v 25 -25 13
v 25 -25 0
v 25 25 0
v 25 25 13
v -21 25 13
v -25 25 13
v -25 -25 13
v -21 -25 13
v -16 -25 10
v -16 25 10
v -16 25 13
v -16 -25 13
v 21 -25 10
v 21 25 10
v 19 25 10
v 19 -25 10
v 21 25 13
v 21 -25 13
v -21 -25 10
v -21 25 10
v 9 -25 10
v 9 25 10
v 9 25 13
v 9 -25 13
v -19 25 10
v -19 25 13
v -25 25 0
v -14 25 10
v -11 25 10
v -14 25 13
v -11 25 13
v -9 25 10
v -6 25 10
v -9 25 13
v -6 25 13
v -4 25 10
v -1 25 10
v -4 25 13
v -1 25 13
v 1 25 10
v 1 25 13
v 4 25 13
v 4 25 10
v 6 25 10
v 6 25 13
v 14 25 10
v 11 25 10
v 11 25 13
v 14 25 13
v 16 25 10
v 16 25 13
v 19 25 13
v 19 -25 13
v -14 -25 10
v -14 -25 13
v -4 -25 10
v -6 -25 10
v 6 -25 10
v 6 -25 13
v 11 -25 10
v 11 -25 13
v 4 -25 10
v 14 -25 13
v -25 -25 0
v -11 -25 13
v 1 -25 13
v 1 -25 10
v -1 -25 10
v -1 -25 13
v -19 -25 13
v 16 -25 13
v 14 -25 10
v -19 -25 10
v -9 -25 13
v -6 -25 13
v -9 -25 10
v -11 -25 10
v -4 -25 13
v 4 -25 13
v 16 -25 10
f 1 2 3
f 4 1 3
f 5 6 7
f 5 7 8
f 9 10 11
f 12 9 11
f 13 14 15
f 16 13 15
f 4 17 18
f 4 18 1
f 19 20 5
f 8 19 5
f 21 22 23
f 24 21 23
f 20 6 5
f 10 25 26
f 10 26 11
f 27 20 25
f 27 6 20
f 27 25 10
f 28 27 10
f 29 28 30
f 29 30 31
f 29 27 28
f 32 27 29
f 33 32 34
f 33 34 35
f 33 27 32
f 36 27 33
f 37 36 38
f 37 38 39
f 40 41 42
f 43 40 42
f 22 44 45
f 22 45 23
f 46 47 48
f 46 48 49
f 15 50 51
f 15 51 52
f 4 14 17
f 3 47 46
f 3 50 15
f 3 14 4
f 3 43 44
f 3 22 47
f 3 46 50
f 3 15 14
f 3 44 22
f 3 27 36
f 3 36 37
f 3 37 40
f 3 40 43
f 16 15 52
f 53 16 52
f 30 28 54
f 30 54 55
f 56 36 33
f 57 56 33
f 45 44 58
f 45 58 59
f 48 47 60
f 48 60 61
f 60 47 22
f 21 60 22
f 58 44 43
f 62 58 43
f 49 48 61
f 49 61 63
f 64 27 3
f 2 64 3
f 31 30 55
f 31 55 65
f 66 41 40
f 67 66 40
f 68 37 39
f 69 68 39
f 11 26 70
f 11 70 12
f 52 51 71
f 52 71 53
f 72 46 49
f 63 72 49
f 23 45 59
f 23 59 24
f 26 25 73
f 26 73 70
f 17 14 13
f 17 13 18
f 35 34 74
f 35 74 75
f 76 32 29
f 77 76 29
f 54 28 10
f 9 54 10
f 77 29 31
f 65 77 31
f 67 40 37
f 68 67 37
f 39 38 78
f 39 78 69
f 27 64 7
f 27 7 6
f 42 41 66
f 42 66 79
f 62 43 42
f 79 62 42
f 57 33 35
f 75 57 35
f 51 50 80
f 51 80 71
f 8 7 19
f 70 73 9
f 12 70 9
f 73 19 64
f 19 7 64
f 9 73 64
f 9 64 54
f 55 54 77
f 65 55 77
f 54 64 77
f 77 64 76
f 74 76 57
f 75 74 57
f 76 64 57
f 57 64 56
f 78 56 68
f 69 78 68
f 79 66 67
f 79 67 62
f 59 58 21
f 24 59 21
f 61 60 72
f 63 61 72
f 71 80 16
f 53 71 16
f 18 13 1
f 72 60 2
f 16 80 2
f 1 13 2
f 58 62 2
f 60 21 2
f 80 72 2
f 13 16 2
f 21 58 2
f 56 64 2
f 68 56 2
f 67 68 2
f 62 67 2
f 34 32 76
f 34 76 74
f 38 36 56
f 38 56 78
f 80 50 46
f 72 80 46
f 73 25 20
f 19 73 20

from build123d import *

# Parameters (mm, degrees)
F0_W     = 50
F0_H     = 50
F1_DEPTH = 13
F2_W     = 2
F2_H     = 3
F3_DEPTH = 50.001


with BuildPart() as f1:
    # F0 (on Top) → F1 (new body)
    with BuildSketch(Plane.XY):
        Rectangle(F0_W, F0_H)
    extrude(amount=F1_DEPTH)

    # F2 (on face) → F3 (cut, through all)
    with BuildSketch(Plane(origin=(0, 25, 0), x_dir=(-1, 0, 0), z_dir=(0, 1, 0))):
        with Locations((-20, 11.5)):
            Rectangle(F2_W, F2_H)
        with Locations((-15, 11.5)):
            Rectangle(F2_W, F2_H)
        with Locations((-10, 11.5)):
            Rectangle(F2_W, F2_H)
        with Locations((-5, 11.5)):
            Rectangle(F2_W, F2_H)
        Polygon((1, 13), (-1, 13), (-1, 10), (0, 10), (1, 10), align=None)
        with Locations((5, 11.5)):
            Rectangle(F2_W, F2_H)
        with Locations((10, 11.5)):
            Rectangle(F2_W, F2_H)
        with Locations((15, 11.5)):
            Rectangle(F2_W, F2_H)
        with Locations((20, 11.5)):
            Rectangle(F2_W, F2_H)
    extrude(amount=-F3_DEPTH, mode=Mode.SUBTRACT)


solid = f1.part
